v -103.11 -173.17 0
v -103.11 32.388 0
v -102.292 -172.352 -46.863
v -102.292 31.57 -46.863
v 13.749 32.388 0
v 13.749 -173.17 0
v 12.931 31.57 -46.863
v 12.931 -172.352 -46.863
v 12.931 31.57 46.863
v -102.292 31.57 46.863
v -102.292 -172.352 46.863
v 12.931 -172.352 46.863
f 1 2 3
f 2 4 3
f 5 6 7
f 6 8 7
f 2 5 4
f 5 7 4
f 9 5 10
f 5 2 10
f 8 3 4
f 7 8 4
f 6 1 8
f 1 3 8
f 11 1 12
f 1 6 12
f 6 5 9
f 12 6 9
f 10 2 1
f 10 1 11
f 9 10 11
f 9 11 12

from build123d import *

# Parameters (mm, degrees)
F0_W     = 116.8592236936
F0_H     = 205.558758229
F1_DEPTH = 46.863
F1_TAPER = 1


with BuildPart() as f1:
    # F0 (on Top) → F1 (new body, symmetric)
    with BuildSketch(Plane.XY):
        with Locations((-44.6808356792, -70.3909788281)):
            Rectangle(F0_W, F0_H)
    extrude(amount=F1_DEPTH, both=True, taper=F1_TAPER)


solid = f1.part
